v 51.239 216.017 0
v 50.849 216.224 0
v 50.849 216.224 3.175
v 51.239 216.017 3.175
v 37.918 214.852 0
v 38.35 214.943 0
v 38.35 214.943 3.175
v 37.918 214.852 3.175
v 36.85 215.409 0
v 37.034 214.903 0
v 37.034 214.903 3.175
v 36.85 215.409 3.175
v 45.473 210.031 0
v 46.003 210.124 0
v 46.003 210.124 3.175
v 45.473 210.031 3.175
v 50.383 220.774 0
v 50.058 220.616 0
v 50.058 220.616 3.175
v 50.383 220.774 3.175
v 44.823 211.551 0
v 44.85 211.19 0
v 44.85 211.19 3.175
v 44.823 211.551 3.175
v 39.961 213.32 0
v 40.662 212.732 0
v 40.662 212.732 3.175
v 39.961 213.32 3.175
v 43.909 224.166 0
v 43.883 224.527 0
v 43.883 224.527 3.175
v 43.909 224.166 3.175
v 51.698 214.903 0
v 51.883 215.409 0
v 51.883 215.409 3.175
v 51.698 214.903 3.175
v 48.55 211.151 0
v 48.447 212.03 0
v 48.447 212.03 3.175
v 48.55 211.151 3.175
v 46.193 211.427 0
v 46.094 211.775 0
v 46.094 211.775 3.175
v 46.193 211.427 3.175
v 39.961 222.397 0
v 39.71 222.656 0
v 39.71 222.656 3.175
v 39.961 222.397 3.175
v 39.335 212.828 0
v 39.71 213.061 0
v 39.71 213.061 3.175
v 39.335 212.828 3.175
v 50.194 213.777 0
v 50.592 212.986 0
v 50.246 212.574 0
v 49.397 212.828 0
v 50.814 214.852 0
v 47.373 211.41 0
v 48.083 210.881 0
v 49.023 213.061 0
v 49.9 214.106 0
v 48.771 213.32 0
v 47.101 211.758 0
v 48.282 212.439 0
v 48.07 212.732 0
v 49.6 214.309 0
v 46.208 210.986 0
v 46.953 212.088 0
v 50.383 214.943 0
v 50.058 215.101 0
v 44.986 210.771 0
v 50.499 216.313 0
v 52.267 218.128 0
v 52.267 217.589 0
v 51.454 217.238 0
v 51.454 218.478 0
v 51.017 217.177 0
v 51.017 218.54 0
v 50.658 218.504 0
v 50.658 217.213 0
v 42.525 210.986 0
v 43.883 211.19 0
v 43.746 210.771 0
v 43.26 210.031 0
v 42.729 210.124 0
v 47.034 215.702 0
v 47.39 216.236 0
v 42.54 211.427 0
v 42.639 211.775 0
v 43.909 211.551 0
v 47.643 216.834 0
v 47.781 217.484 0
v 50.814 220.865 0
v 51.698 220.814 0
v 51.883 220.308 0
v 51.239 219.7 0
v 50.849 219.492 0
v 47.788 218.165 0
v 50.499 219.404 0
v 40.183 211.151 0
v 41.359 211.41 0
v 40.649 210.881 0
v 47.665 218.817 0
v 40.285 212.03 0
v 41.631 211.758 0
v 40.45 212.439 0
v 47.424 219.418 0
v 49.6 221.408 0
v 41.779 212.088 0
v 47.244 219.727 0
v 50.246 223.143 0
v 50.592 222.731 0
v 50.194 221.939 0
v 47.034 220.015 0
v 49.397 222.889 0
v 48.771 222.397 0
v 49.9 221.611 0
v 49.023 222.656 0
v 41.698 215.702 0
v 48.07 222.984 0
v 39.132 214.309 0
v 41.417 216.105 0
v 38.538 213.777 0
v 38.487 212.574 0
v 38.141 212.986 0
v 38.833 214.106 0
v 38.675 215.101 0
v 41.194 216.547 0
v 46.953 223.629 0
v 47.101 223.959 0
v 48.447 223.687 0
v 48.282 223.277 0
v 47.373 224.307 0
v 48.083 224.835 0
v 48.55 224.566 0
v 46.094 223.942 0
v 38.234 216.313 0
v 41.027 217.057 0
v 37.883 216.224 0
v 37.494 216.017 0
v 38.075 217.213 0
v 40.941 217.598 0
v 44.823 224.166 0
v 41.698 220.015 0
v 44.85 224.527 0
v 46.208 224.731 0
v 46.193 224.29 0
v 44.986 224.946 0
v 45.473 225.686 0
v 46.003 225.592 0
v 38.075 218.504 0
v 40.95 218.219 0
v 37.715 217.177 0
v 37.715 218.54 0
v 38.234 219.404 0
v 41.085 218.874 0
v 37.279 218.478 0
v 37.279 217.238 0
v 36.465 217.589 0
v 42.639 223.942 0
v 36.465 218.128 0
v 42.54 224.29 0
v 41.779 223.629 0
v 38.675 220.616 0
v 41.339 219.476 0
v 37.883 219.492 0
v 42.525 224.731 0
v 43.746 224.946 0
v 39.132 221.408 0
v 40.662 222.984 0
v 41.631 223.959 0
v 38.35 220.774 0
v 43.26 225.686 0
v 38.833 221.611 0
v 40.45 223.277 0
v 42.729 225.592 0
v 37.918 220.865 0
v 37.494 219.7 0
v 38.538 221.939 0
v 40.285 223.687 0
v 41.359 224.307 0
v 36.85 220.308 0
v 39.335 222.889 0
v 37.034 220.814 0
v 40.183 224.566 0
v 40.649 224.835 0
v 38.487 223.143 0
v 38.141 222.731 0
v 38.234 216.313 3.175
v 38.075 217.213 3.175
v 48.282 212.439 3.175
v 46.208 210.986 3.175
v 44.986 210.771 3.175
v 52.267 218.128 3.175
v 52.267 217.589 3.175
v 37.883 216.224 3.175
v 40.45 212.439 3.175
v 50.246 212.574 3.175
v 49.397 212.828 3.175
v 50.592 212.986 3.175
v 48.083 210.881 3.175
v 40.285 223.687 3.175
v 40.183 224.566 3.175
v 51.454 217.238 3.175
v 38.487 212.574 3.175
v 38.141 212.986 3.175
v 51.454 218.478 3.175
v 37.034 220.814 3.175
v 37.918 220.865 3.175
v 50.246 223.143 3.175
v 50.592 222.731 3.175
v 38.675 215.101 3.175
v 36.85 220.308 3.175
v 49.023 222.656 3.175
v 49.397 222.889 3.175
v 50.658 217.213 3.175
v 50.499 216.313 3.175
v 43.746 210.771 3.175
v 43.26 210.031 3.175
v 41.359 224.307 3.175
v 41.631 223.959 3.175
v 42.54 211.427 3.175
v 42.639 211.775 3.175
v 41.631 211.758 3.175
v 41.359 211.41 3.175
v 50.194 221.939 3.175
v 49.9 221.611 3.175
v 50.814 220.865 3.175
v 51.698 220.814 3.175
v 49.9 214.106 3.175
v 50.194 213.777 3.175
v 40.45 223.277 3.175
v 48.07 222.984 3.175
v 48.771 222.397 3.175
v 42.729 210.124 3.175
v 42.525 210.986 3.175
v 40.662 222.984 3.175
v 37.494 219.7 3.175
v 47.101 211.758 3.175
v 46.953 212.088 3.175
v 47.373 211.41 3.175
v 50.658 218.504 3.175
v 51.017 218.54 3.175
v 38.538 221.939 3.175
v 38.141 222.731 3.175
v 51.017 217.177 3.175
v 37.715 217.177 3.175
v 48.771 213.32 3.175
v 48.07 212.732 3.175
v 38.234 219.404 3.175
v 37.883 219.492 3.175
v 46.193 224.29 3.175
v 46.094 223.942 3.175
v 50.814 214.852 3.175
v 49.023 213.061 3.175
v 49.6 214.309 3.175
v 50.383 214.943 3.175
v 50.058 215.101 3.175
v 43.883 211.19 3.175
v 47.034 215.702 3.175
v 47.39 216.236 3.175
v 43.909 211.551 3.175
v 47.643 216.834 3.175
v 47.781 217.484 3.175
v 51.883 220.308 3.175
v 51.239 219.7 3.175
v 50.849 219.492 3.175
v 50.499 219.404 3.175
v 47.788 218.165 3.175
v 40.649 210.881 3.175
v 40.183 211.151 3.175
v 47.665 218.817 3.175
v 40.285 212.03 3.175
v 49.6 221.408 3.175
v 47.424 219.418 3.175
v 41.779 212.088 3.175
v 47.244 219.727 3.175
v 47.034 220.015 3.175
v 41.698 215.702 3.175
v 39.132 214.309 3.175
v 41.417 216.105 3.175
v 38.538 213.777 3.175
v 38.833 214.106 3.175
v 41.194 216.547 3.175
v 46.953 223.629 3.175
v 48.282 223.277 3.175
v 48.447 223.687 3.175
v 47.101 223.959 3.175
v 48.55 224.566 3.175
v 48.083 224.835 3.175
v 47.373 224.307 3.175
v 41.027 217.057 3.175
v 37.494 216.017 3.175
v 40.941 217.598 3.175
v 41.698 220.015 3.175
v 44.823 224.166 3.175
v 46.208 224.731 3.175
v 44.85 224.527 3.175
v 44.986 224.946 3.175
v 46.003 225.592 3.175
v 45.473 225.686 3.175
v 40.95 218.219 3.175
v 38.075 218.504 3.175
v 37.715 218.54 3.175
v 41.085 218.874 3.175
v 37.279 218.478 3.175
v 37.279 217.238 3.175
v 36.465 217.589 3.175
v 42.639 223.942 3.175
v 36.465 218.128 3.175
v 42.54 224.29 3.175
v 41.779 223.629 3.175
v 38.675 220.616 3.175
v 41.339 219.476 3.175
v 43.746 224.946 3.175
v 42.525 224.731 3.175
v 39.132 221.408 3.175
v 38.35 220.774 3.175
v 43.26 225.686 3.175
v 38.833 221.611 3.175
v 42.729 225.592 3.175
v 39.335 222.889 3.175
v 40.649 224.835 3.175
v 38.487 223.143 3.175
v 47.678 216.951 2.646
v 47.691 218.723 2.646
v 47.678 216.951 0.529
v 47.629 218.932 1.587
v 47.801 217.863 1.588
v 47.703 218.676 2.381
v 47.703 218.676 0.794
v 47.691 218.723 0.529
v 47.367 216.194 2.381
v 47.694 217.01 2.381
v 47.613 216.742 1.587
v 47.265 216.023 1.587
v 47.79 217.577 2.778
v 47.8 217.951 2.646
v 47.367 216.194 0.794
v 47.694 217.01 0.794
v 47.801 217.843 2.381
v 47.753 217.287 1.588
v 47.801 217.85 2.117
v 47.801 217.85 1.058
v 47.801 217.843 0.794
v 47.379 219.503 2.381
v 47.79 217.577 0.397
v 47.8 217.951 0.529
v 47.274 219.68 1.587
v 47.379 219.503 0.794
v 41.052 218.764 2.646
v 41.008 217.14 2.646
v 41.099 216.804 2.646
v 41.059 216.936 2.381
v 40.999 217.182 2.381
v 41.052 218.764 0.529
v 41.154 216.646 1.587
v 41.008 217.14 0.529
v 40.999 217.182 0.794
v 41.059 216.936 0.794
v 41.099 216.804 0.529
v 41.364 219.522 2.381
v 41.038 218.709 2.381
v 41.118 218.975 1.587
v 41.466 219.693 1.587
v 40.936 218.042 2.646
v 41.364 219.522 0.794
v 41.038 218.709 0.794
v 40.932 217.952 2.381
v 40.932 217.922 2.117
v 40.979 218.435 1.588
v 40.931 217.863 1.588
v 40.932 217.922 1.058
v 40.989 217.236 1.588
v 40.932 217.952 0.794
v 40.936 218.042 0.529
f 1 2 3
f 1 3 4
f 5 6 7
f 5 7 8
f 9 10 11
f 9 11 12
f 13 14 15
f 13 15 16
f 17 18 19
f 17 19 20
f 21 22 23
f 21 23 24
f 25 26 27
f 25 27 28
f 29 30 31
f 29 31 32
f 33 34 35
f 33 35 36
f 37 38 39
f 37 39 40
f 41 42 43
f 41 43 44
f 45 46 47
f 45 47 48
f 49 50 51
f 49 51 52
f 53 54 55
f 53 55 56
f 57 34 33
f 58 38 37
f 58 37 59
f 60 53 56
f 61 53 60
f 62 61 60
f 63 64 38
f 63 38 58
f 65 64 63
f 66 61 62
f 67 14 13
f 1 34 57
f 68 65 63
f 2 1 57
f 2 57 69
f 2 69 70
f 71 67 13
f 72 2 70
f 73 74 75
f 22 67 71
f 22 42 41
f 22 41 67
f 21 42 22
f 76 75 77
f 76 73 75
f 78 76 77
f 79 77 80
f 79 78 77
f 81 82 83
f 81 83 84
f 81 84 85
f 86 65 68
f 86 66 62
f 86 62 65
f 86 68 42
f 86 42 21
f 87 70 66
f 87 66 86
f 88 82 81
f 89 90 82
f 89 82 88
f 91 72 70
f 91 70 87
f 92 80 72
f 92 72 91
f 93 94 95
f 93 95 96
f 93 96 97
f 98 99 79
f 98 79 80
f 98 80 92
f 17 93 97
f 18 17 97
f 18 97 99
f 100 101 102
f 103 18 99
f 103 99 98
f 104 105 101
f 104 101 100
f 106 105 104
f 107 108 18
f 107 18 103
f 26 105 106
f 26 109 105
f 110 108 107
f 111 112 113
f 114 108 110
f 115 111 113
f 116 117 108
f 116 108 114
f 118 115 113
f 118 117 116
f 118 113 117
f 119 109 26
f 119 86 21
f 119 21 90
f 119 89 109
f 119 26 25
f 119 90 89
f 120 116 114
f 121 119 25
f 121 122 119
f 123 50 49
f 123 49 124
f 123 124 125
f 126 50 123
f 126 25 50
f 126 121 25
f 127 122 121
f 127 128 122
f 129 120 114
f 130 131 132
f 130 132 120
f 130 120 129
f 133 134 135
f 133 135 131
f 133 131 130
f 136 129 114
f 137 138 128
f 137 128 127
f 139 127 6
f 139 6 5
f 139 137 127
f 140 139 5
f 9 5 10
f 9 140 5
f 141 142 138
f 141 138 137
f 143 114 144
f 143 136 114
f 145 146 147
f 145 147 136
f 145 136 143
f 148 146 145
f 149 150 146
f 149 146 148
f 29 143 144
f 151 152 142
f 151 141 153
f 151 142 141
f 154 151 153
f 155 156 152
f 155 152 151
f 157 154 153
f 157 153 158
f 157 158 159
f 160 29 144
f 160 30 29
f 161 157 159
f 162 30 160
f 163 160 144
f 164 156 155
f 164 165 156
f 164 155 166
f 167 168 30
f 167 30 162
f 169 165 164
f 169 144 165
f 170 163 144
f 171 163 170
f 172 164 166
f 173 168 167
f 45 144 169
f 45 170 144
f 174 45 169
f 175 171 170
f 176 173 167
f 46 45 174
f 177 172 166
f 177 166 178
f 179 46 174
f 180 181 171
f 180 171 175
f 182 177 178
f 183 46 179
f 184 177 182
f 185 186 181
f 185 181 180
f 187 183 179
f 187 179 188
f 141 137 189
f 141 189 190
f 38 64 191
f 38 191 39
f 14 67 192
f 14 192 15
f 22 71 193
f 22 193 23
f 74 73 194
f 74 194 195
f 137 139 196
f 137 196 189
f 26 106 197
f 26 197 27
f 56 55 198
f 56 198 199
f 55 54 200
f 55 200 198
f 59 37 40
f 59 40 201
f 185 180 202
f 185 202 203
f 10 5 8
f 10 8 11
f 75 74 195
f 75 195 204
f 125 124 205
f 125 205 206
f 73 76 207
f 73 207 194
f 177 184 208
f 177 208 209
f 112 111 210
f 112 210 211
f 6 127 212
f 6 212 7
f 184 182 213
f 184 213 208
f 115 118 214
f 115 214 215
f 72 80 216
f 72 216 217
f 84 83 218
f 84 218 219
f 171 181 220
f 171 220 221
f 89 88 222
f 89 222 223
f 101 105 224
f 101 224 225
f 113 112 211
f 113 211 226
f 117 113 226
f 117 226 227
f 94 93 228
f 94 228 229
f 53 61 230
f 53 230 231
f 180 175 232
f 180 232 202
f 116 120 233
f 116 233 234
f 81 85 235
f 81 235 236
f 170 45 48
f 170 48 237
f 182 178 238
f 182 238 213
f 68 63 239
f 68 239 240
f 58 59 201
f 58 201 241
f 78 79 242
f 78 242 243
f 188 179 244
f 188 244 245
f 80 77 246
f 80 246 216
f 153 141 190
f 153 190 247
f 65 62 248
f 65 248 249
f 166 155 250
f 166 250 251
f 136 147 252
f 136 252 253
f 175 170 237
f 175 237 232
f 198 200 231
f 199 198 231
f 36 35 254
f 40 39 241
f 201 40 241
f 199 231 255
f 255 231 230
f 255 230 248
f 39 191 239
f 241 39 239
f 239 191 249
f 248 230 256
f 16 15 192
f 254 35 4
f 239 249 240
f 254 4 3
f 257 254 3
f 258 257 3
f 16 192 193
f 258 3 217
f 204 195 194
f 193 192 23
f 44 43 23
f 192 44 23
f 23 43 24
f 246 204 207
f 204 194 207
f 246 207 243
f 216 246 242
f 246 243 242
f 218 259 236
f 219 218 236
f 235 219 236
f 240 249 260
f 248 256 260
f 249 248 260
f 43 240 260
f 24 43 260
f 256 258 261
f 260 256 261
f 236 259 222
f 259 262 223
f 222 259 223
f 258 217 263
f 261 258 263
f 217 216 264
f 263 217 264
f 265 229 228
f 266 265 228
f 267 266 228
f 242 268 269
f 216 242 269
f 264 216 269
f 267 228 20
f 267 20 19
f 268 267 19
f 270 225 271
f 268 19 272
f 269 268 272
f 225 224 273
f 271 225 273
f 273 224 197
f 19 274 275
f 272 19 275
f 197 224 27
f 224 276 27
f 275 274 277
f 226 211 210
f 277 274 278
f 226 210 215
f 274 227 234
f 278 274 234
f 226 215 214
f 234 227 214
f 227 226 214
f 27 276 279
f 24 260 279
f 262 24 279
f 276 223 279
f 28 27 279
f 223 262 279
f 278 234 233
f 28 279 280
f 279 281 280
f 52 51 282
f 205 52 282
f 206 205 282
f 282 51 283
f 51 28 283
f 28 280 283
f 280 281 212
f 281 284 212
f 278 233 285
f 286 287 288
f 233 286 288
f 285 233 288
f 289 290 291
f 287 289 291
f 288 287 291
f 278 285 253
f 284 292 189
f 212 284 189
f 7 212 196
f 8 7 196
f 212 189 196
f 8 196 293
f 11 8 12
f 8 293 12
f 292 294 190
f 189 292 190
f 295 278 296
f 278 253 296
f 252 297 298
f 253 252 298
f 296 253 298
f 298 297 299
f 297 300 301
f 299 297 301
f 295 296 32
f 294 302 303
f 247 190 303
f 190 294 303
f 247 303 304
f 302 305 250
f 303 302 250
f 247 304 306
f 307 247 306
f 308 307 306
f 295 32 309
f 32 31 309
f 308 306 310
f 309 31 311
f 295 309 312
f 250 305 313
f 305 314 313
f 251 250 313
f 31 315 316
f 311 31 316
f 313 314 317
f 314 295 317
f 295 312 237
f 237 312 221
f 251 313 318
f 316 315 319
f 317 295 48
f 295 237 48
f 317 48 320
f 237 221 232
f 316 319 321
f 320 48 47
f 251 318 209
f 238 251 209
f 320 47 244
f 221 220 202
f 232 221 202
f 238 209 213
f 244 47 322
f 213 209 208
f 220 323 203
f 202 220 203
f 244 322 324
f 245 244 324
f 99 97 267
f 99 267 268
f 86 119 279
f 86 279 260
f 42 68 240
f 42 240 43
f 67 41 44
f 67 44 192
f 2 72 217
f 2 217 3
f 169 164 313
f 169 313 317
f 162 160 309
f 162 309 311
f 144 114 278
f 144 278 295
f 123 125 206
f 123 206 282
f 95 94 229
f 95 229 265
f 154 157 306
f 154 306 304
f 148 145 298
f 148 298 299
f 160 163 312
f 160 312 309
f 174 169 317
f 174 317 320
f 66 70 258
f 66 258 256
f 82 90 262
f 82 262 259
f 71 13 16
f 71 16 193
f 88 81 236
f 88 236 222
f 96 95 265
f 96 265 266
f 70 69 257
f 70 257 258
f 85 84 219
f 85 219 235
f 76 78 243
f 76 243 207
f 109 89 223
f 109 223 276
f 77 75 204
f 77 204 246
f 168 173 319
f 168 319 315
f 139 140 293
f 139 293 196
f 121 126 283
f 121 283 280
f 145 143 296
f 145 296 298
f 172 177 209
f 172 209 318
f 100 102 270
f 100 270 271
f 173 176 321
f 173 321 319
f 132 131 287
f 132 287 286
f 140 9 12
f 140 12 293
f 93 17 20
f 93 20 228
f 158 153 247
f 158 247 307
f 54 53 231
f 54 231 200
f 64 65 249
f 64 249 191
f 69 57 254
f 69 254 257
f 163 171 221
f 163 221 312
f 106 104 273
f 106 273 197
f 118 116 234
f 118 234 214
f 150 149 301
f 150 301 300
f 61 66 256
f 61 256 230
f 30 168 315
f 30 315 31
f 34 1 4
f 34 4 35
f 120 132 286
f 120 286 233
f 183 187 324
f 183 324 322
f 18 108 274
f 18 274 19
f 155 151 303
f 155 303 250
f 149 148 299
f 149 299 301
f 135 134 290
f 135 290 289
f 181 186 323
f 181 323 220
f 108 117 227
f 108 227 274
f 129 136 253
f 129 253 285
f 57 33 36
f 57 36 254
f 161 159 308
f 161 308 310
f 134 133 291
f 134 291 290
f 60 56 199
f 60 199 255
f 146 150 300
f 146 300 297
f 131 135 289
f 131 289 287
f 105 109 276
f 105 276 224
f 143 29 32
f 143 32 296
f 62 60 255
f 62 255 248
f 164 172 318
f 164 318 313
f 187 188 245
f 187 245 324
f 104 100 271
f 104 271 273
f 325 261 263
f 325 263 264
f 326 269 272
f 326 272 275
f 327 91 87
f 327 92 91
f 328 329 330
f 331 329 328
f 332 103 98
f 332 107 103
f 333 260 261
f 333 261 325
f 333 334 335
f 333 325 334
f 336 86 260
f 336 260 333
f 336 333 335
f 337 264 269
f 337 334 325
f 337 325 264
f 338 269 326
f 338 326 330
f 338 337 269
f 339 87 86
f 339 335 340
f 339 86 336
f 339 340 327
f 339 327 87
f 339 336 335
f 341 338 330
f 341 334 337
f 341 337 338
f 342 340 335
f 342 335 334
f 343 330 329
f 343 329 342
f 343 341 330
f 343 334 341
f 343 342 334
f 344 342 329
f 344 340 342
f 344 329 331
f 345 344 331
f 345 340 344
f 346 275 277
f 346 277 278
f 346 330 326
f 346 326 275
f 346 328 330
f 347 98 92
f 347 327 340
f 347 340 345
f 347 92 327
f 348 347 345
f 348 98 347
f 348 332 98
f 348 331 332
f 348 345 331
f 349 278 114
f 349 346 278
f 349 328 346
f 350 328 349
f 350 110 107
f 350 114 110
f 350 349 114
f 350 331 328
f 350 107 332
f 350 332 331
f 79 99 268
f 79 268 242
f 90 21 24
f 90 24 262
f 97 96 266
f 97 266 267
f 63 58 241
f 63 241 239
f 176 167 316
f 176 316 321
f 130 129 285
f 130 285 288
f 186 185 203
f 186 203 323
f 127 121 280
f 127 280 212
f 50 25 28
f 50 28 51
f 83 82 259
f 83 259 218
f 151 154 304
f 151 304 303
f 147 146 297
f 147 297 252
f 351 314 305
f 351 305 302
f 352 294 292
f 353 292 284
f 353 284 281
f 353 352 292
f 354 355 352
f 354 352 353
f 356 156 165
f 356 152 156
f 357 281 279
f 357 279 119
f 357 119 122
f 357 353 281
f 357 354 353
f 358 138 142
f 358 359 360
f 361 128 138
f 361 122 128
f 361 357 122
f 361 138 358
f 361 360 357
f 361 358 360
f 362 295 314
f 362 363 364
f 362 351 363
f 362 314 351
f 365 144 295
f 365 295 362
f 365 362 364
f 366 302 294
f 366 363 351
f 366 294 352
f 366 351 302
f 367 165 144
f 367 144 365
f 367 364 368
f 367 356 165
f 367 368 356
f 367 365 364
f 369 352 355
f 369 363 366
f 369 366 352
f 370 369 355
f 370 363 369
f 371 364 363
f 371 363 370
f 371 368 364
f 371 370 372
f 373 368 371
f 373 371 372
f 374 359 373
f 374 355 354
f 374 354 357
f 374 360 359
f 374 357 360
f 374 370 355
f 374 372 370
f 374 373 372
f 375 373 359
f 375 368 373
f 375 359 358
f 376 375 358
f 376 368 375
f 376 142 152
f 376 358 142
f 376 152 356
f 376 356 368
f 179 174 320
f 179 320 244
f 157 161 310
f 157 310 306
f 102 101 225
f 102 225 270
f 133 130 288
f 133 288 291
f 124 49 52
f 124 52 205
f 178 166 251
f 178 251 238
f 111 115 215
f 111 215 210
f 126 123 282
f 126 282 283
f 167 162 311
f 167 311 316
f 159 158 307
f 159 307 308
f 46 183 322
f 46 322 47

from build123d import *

# Parameters (mm, degrees)
BOSS_EXTRUDE2_DEPTH = 3.175


with BuildPart() as part:
    # sun → Boss-Extrude2 (new body)
    with BuildSketch(Plane(origin=(6.251367358, 48.255911881, 0), x_dir=(1, 0, 0), z_dir=(0, 0, 1))):
        Polygon((44.40620191, 170.247646781), (44.76575291, 170.284335781), (45.20263291, 170.222528781), (46.01571591, 169.872008781), (46.01571591, 169.332963781), (45.20263291, 168.982443781), (44.76575291, 168.920637781), (44.40620191, 168.957326781), (44.24731091, 168.056755781), (44.59783091, 167.968419781), (44.98729791, 167.760986781), (45.63132891, 167.153361781), (45.44703791, 166.647055781), (44.56311791, 166.595690781), (44.13159991, 166.686848781), (43.80619791, 166.844610781), (43.34899791, 166.052695781), (43.64815291, 165.849777781), (43.94307591, 165.521552781), (44.34044391, 164.730201781), (43.99415791, 164.317592781), (43.14579791, 164.571592781), (42.77157091, 164.804990781), (42.51982891, 165.064352781), (41.81907091, 164.476483781), (42.03101991, 164.183537781), (42.19583791, 163.774315781), (42.29856691, 162.894910781), (41.83205291, 162.625388781), (41.12169991, 163.154272781), (40.84991991, 163.501688781), (40.70203591, 163.831606781), (39.84266891, 163.518621781), (39.94144691, 163.170923781), (39.95640391, 162.730092781), (39.75207591, 161.868468781), (39.22149791, 161.775052781), (38.73494691, 162.514757781), (38.59835091, 162.934139781), (38.57210391, 163.294819781), (37.65770391, 163.294819781), (37.63145791, 162.934139781), (37.49486191, 162.514757781), (37.00831091, 161.775052781), (36.47773291, 161.868468781), (36.27340391, 162.730092781), (36.28836191, 163.170923781), (36.38713991, 163.518621781), (35.52777291, 163.831606781), (35.37988891, 163.501688781), (35.10810891, 163.154272781), (34.39775591, 162.625388781), (33.93124191, 162.894910781), (34.03397091, 163.774315781), (34.19878891, 164.183537781), (34.41073791, 164.476483781), (33.70997991, 165.064352781), (33.45823791, 164.804990781), (33.08401091, 164.571592781), (32.23565091, 164.317592781), (31.88936391, 164.730201781), (32.28673291, 165.521552781), (32.58165591, 165.849777781), (32.88081091, 166.052695781), (32.42361091, 166.844610781), (32.09820891, 166.686848781), (31.66669091, 166.595690781), (30.78277091, 166.647055781), (30.59847991, 167.153361781), (31.24251091, 167.760986781), (31.63197791, 167.968419781), (31.98249791, 168.056755781), (31.82360691, 168.957326781), (31.46405591, 168.920637781), (31.02717591, 168.982443781), (30.21409291, 169.332963781), (30.21409291, 169.872008781), (31.02717591, 170.222528781), (31.46405591, 170.284335781), (31.82360691, 170.247646781), (31.98249791, 171.148217781), (31.63197791, 171.236552781), (31.24251091, 171.443986781), (30.59847991, 172.051610781), (30.78277091, 172.557917781), (31.66669091, 172.609281781), (32.09820891, 172.518123781), (32.42361091, 172.360361781), (32.88081091, 173.152277781), (32.58165591, 173.355195781), (32.28673291, 173.683419781), (31.88936391, 174.474770781), (32.23565091, 174.887379781), (33.08401091, 174.633379781), (33.45823791, 174.399981781), (33.70997991, 174.140619781), (34.41073791, 174.728488781), (34.19878891, 175.021435781), (34.03397091, 175.430657781), (33.93124191, 176.310061781), (34.39775591, 176.579583781), (35.10810891, 176.050699781), (35.37988891, 175.703283781), (35.52777291, 175.373366781), (36.38713991, 175.686350781), (36.28836191, 176.034048781), (36.27340391, 176.474879781), (36.47773291, 177.336503781), (37.00831091, 177.429919781), (37.49486191, 176.690215781), (37.63145791, 176.270832781), (37.65770391, 175.910152781), (38.57210391, 175.910152781), (38.59835091, 176.270832781), (38.73494691, 176.690215781), (39.22149791, 177.429919781), (39.75207591, 177.336503781), (39.95640391, 176.474879781), (39.94144691, 176.034048781), (39.84266891, 175.686350781), (40.70203591, 175.373366781), (40.84991991, 175.703283781), (41.12169991, 176.050699781), (41.83205291, 176.579583781), (42.29856691, 176.310061781), (42.19583791, 175.430657781), (42.03101991, 175.021435781), (41.81907091, 174.728488781), (42.51982891, 174.140619781), (42.77157091, 174.399981781), (43.14579791, 174.633379781), (43.99415791, 174.887379781), (44.34044391, 174.474770781), (43.94307591, 173.683419781), (43.64815291, 173.355195781), (43.34899791, 173.152277781), (43.80619791, 172.360361781), (44.13159991, 172.518123781), (44.56311791, 172.609281781), (45.44703791, 172.557917781), (45.63132891, 172.051610781), (44.98729791, 171.443986781), (44.59783091, 171.236552781), (44.24731091, 171.148217781), align=None)
        with BuildLine():
            Line((35.44702391, 167.446136781), (40.78278491, 167.446136781))
            add(Edge.make_bspline(
                [(40.78278491, 167.446136781), (41.26046891, 168.035989781), (41.55007691, 168.788751781), (41.55007691, 169.606900781)],
                knots=[0, 0, 0, 0, 1, 1, 1, 1], degree=3))
            add(Edge.make_bspline(
                [(41.55007691, 169.606900781), (41.55007691, 170.425048781), (41.26046891, 171.168991781), (40.78278491, 171.758844781)],
                knots=[0, 0, 0, 0, 1, 1, 1, 1], degree=3))
            Line((40.78278491, 171.758844781), (35.44702391, 171.758844781))
            add(Edge.make_bspline(
                [(35.44702391, 171.758844781), (34.96933991, 171.168991781), (34.67973191, 170.425048781), (34.67973191, 169.606900781)],
                knots=[0, 0, 0, 0, 1, 1, 1, 1], degree=3))
            add(Edge.make_bspline(
                [(34.67973191, 169.606900781), (34.67973191, 168.788751781), (34.96933991, 168.035989781), (35.44702391, 167.446136781)],
                knots=[0, 0, 0, 0, 1, 1, 1, 1], degree=3))
        make_face(mode=Mode.SUBTRACT)
    extrude(amount=BOSS_EXTRUDE2_DEPTH)


solid = part.part
